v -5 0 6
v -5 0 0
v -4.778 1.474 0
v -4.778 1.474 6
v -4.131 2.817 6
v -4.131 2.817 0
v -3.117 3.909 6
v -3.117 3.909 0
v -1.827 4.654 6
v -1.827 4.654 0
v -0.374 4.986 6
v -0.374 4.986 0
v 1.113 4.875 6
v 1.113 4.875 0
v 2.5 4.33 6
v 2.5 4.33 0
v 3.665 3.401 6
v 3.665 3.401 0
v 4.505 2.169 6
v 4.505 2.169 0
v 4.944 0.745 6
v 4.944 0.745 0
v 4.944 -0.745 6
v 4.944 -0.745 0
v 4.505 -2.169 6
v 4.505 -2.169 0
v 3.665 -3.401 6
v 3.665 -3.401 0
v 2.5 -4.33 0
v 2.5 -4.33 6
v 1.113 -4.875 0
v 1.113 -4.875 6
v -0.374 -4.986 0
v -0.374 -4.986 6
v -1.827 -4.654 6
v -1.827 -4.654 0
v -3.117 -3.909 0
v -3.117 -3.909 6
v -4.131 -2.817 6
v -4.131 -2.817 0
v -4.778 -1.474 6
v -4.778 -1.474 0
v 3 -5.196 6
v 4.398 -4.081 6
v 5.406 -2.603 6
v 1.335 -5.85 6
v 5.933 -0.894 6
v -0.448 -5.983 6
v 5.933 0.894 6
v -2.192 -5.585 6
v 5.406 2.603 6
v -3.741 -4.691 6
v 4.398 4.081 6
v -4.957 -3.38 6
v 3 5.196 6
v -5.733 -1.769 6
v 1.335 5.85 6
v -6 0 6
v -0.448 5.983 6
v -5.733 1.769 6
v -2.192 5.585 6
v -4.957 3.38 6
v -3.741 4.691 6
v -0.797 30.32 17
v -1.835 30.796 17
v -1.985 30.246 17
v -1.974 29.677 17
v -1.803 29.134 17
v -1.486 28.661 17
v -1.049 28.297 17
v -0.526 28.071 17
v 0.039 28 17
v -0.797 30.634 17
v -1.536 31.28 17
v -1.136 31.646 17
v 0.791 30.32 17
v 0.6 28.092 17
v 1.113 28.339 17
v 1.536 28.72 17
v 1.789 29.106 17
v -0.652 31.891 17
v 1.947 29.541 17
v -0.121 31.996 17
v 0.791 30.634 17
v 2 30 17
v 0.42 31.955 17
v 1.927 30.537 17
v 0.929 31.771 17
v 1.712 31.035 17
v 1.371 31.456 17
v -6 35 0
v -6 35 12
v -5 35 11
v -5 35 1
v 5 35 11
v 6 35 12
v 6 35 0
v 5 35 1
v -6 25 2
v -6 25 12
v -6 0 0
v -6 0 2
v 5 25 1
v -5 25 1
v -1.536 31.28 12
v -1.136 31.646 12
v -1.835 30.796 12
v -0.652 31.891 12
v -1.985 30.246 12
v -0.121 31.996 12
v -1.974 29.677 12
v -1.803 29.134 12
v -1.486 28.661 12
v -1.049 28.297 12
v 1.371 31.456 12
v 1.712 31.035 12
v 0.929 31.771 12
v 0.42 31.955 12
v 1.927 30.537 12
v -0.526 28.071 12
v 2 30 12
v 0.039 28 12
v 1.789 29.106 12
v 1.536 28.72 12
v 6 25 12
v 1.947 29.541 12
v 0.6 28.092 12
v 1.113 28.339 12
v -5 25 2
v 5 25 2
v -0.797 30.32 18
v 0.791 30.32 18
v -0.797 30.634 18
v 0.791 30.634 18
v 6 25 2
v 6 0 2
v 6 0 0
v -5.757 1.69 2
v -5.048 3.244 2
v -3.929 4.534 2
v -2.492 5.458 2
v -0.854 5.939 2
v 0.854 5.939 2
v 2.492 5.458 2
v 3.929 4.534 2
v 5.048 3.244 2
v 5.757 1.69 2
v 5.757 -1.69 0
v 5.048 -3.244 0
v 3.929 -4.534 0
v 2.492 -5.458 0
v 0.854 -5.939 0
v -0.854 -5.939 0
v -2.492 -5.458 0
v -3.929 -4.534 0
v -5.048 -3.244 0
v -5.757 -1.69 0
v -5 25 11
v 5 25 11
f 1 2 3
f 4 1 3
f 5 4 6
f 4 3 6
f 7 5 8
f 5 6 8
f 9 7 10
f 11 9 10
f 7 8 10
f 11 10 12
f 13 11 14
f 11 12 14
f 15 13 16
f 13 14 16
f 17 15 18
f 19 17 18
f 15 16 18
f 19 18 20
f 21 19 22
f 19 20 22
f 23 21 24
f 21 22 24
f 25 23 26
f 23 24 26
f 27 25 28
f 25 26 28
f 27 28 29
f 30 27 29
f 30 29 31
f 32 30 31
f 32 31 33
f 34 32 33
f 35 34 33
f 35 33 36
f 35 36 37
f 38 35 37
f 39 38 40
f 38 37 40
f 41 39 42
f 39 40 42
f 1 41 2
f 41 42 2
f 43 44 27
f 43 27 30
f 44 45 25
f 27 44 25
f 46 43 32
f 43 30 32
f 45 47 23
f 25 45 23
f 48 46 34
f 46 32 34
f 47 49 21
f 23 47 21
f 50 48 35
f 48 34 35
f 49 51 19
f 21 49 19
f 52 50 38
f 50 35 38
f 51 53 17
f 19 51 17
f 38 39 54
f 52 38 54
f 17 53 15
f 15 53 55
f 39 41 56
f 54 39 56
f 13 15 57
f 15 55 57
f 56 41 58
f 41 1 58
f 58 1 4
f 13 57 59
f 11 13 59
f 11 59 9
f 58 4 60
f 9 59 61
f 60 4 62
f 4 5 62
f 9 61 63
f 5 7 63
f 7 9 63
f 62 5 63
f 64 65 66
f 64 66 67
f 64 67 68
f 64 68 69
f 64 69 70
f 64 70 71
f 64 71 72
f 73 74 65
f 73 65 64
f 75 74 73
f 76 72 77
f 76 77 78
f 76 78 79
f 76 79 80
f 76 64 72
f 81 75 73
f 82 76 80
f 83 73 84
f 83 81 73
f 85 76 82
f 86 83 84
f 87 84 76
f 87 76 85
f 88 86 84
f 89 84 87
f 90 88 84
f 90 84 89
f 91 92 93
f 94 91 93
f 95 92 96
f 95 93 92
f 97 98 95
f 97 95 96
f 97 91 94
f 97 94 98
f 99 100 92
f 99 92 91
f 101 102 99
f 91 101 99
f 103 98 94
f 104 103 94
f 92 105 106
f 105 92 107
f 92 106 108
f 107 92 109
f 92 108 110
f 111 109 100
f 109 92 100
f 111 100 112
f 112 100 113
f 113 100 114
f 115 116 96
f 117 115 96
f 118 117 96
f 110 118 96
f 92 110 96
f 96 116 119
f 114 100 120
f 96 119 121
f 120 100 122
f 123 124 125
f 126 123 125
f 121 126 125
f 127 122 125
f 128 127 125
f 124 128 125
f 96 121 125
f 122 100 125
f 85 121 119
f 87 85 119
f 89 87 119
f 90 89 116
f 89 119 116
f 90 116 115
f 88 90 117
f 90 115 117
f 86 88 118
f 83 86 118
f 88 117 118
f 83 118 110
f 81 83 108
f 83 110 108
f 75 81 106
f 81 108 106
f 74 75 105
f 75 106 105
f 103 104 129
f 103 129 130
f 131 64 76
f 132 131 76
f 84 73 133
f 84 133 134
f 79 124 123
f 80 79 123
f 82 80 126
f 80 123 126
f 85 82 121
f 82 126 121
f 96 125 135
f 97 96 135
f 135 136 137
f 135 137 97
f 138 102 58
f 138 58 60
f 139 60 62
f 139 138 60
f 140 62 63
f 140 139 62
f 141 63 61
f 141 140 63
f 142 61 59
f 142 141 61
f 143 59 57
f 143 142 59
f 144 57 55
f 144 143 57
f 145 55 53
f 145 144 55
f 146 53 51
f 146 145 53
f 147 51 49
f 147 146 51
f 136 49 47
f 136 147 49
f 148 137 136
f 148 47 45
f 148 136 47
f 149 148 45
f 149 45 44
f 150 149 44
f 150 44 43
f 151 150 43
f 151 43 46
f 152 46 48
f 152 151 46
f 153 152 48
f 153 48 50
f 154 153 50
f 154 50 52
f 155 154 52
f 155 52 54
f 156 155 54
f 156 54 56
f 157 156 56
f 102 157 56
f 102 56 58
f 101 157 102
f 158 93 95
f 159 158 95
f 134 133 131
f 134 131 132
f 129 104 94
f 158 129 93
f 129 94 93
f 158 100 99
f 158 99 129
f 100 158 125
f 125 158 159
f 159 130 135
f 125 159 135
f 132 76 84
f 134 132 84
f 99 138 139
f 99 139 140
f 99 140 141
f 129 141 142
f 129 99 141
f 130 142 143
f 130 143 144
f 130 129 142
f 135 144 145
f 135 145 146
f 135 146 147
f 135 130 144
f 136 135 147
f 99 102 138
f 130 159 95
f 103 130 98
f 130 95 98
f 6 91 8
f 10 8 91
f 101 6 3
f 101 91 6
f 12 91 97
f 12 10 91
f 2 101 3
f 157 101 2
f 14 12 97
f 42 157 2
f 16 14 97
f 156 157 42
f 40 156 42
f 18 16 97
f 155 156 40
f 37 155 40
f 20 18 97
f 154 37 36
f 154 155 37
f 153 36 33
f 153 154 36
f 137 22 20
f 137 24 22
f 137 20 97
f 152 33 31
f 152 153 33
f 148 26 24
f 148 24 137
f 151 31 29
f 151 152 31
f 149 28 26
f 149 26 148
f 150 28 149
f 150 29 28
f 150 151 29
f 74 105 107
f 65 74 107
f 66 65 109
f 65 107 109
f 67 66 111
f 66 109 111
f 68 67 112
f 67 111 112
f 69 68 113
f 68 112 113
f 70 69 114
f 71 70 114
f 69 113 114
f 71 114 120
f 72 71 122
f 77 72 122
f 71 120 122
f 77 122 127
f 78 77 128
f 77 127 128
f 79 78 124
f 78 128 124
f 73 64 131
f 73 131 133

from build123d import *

# Parameters (mm, degrees)
EXTRUDE_1_DEPTH     = 2
SKETCH_4_R          = 6
SKETCH_4_R_2        = 5
EXTRUDE_2_DEPTH     = 6
SKETCH_5_W          = 12
SKETCH_5_H          = 12
EXTRUDE_3_DEPTH     = 10
CUT_EXTRUDE_1_DEPTH = 10
EXTRUDE_4_DEPTH     = 5
SKETCH_9_W          = 1.588517845
SKETCH_9_H          = 0.313853782
EXTRUDE_6_DEPTH     = 1


with BuildPart() as part:
    # 草图1 → 凸台-拉伸1 (new body)
    with BuildSketch(Plane.XY):
        with BuildLine():
            ThreePointArc((-6, 0), (0, 6), (6, 0))
            Line((6, 0), (6, 25))
            Line((6, 25), (-6, 25))
            Line((-6, 25), (-6, 0))
        make_face()
    extrude(amount=EXTRUDE_1_DEPTH)

    # 草图4 → 凸台-拉伸2 (add)
    with BuildSketch(Plane(origin=(0, 0, 0), x_dir=(-1, 0, 0), z_dir=(0, 0, -1))):
        Circle(SKETCH_4_R)
        Circle(SKETCH_4_R_2, mode=Mode.SUBTRACT)
    extrude(amount=-EXTRUDE_2_DEPTH)

    # 草图5 → 凸台-拉伸3 (add)
    with BuildSketch(Plane(origin=(0, 25, 0), x_dir=(1, 0, 0), z_dir=(0, 1, 0))):
        with Locations((0, -6)):
            Rectangle(SKETCH_5_W, SKETCH_5_H)
    extrude(amount=EXTRUDE_3_DEPTH)

    # 草图6 → 切除-拉伸1 (cut)
    with BuildSketch(Plane(origin=(0, 35, 0), x_dir=(1, 0, 0), z_dir=(0, 1, 0))):
        Polygon((5, -1), (-5, -1), (5, -11), align=None)
        Polygon((5, -11), (-5, -1), (-5, -11), align=None)
    extrude(amount=-CUT_EXTRUDE_1_DEPTH, mode=Mode.SUBTRACT)

    # 草图7 → 凸台-拉伸4 (add)
    with BuildSketch(Plane.XY.offset(12)):
        with BuildLine():
            ThreePointArc((2, 30), (0.680850528, 31.880543155), (-1.536442559, 31.280368799))
            Line((-1.536442559, 31.280368799), (1.536442559, 28.719631201))
            ThreePointArc((1.536442559, 28.719631201), (1.880543155, 29.319149472), (2, 30))
        make_face()
        with BuildLine():
            Line((1.536442559, 28.719631201), (-1.536442559, 31.280368799))
            ThreePointArc((-1.536442559, 31.280368799), (-1.280368799, 28.463557441), (1.536442559, 28.719631201))
        make_face()
    extrude(amount=EXTRUDE_4_DEPTH)

    # 草图9 → 凸台-拉伸6 (add)
    with BuildSketch(Plane.XY.offset(17)):
        with Locations((-0.002943276, 30.476616651)):
            Rectangle(SKETCH_9_W, SKETCH_9_H)
    extrude(amount=EXTRUDE_6_DEPTH)


solid = part.part
